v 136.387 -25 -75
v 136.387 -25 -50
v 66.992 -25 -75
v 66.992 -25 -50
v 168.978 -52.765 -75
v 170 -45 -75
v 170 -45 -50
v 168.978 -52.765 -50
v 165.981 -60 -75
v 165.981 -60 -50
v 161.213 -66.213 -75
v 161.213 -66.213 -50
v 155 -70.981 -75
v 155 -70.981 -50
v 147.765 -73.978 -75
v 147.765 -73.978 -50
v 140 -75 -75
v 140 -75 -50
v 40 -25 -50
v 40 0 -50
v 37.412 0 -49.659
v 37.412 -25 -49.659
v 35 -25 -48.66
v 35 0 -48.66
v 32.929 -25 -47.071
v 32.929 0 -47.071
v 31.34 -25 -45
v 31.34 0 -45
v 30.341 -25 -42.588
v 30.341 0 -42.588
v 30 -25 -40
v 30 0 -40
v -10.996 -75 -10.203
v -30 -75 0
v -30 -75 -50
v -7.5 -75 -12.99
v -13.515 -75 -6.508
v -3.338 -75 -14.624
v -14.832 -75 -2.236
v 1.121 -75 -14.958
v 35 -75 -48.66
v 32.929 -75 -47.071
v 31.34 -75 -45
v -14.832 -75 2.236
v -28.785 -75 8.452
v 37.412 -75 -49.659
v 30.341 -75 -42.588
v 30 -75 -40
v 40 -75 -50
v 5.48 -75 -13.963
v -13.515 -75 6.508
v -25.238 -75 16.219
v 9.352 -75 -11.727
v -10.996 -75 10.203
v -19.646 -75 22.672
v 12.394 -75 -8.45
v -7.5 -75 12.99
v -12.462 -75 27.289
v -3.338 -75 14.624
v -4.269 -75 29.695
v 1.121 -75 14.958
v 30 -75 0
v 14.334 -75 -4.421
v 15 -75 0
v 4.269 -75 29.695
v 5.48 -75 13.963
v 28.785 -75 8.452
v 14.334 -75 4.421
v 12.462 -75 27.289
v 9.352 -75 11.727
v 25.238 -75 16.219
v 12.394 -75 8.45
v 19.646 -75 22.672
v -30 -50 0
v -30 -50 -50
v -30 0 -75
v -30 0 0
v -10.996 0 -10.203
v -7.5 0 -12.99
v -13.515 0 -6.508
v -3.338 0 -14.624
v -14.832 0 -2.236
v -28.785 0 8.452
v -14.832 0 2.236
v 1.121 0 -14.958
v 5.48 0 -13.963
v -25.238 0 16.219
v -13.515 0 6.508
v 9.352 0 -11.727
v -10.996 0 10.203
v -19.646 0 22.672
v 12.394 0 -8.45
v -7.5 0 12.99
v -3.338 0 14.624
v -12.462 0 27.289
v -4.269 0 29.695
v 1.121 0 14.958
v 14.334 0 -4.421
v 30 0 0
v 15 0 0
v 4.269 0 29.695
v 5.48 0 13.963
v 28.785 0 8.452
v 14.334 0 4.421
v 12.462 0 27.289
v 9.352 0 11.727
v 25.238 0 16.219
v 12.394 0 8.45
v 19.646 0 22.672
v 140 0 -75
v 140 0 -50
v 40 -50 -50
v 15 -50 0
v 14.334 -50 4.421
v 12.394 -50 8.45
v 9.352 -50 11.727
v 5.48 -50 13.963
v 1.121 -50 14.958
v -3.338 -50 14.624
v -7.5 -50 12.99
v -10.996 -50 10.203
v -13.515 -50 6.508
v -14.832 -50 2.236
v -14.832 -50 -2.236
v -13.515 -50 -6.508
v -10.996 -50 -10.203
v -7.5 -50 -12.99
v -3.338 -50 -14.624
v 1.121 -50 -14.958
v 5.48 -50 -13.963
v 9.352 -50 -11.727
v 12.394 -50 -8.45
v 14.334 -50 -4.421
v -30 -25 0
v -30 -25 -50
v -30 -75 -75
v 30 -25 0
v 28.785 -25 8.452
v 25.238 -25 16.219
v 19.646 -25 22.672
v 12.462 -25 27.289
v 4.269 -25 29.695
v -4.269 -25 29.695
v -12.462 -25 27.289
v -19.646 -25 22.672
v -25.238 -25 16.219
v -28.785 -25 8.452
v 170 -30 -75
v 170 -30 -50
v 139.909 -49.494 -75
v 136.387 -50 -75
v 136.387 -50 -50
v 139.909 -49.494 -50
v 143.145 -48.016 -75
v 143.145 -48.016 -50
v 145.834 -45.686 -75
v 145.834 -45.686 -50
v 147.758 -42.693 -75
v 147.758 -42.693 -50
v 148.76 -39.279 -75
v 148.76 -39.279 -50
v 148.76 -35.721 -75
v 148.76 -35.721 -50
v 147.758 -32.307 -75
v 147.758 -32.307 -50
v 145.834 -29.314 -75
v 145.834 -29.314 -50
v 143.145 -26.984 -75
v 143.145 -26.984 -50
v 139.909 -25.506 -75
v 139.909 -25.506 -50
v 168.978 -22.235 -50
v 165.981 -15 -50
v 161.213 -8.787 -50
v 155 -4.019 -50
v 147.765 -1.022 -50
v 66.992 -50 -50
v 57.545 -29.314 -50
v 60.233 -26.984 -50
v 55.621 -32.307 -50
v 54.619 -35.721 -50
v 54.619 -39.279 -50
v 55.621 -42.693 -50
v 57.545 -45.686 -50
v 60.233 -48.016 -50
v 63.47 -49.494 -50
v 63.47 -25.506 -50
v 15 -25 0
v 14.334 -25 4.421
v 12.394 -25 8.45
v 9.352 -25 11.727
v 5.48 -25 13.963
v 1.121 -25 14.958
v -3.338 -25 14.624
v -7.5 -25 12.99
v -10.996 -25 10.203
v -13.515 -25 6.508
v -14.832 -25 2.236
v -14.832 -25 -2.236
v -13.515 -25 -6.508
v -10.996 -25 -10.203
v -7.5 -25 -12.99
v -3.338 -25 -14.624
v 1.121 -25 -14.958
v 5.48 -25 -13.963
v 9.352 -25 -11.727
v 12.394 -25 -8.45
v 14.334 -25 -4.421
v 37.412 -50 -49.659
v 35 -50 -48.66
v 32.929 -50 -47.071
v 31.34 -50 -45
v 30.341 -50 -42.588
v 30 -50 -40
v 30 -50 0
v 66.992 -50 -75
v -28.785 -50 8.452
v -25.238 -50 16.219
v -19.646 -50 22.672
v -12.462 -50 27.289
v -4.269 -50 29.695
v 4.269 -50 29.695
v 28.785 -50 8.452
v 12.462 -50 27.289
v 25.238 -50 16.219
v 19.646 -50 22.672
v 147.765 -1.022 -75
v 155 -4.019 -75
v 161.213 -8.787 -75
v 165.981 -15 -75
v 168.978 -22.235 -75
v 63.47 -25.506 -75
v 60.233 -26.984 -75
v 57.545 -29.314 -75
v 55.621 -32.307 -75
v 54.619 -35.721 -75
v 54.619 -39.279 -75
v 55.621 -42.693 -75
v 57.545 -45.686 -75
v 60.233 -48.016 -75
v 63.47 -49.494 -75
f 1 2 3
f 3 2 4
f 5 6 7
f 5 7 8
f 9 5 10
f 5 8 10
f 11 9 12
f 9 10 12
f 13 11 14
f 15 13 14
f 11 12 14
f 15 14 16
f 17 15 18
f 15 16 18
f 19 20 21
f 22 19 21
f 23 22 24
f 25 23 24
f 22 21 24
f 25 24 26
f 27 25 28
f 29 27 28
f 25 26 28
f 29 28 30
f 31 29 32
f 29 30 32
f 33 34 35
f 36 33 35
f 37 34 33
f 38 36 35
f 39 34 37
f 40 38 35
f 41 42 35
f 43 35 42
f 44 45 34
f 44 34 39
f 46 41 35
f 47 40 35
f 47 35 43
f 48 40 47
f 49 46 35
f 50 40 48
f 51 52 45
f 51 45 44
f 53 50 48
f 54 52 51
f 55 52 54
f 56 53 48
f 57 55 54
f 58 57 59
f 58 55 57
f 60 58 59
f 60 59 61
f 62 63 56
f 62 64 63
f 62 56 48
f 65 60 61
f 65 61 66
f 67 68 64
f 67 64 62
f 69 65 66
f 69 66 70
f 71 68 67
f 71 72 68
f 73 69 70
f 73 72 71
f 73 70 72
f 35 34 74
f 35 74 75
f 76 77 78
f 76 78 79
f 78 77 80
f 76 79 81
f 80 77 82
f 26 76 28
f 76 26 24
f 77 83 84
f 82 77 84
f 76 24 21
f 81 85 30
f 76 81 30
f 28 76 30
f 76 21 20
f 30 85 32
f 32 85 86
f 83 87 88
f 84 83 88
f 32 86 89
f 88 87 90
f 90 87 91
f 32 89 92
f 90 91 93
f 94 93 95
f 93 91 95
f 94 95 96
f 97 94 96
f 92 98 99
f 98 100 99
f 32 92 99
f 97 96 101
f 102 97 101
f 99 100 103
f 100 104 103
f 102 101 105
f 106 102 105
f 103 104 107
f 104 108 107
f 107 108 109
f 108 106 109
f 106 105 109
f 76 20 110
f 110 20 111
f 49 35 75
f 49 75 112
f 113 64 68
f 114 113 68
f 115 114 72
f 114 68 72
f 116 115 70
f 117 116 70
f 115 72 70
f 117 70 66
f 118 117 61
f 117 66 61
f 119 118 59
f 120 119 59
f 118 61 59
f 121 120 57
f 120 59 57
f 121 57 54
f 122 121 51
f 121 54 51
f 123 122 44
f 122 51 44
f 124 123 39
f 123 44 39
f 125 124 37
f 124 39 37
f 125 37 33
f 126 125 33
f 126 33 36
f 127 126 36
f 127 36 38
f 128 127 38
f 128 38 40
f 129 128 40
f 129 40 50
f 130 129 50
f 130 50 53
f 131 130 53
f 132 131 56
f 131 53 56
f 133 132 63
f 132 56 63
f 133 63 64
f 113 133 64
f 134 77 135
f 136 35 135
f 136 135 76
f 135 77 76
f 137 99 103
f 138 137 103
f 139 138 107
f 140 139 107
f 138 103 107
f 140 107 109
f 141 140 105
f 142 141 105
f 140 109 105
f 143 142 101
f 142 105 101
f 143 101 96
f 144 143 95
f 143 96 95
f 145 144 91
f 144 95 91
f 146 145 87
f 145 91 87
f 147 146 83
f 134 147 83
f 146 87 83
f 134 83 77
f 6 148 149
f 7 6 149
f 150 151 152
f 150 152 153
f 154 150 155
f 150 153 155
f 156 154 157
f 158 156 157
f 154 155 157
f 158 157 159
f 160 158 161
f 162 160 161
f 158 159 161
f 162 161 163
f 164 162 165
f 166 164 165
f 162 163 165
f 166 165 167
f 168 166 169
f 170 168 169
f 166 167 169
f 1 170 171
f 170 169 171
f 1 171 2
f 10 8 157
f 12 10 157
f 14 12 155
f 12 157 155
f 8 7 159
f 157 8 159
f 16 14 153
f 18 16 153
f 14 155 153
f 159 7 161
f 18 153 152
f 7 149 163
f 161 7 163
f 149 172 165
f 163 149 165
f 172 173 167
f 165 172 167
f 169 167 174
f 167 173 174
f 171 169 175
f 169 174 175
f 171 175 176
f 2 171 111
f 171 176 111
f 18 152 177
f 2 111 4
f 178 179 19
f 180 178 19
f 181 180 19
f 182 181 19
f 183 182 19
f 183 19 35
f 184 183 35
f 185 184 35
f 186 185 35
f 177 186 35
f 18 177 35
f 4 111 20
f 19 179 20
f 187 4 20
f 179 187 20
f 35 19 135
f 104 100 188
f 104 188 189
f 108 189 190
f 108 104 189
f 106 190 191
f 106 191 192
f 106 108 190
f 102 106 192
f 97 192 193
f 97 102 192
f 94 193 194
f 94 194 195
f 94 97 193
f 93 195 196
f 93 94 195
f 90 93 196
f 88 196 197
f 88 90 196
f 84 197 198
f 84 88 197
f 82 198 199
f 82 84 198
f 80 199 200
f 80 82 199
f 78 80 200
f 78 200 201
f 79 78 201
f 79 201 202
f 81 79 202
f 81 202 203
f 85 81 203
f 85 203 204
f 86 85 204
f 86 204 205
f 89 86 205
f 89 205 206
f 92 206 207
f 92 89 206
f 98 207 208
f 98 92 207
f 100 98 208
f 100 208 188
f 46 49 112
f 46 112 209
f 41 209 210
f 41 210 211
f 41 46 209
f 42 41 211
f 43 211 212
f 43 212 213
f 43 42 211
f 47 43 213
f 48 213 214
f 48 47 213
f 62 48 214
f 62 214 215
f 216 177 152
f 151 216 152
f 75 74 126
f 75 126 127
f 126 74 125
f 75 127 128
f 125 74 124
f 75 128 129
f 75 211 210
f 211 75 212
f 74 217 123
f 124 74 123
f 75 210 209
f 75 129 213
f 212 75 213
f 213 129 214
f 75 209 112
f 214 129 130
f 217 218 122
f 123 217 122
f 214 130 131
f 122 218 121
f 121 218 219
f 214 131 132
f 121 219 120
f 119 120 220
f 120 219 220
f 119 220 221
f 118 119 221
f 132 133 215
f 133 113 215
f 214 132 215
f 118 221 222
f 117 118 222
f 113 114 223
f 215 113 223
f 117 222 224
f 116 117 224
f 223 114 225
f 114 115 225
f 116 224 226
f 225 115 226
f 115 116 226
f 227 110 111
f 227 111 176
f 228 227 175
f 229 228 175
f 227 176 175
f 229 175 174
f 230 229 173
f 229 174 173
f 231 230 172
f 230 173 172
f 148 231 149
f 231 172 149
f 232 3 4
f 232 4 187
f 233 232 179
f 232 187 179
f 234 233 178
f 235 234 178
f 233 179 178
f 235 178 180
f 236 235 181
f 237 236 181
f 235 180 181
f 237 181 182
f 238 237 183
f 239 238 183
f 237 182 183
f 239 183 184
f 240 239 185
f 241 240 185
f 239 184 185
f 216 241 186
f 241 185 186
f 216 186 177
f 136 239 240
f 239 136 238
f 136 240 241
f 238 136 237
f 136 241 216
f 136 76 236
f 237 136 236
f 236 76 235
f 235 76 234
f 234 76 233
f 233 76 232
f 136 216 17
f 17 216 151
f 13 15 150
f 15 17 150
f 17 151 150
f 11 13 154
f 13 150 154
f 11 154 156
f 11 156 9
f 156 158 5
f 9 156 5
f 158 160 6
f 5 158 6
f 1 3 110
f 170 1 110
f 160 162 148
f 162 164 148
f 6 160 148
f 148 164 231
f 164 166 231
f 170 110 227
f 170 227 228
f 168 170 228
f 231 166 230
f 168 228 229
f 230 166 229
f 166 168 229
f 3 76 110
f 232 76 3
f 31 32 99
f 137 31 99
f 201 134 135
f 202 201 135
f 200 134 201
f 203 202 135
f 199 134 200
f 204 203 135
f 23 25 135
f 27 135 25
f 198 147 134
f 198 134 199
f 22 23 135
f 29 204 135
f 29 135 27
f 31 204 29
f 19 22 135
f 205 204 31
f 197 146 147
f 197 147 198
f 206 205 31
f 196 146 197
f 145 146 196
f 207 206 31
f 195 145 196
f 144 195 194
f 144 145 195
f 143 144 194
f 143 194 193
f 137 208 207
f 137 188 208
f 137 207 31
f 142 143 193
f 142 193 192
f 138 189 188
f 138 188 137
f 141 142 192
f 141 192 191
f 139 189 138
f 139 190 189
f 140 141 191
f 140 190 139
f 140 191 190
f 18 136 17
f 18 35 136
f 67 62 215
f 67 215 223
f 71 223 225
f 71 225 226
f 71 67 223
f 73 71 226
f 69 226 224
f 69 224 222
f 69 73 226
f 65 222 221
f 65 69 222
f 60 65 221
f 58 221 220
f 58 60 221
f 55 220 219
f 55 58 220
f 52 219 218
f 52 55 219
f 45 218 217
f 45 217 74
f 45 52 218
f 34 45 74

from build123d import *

# Parameters (mm, degrees)
F1_DEPTH = 75
F0_R     = 15
F2_DEPTH = 25
F3_R     = 15
F4_DEPTH = 25
F6_DEPTH = 25
F7_R     = 30


with BuildPart() as f1:
    # F0 (on Front) → F1 (new body)
    with BuildSketch(Plane.XZ):
        Polygon((40, -50), (-30, -50), (-30, -75), (170, -75), (170, -50), align=None)
    extrude(amount=F1_DEPTH)

    # F0 (on Front) → F2 (join)
    with BuildSketch(Plane.XZ):
        with BuildLine():
            Line((30, -40), (30, 0))
            ThreePointArc((30, 0), (0, 30), (-30, 0))
            Line((-30, 0), (-30, -50))
            Line((-30, -50), (40, -50))
            ThreePointArc((40, -50), (32.928932, -47.071068), (30, -40))
        make_face()
        Circle(F0_R, mode=Mode.SUBTRACT)
    extrude(amount=F2_DEPTH)

    # F5 (on face) → F6 (cut)
    with BuildSketch(Plane.XY.offset(-50)):
        with BuildLine():
            Line((136.387348, -25), (66.991508, -25))
            ThreePointArc((66.991508, -25), (54.491508, -37.5), (66.991508, -50))
            Line((66.991508, -50), (136.387348, -50))
            ThreePointArc((136.387348, -50), (148.887348, -37.5), (136.387348, -25))
        make_face()
    extrude(amount=-F6_DEPTH, mode=Mode.SUBTRACT)

    # F7
    f7_edges = [f1.edges().sort_by_distance(p)[0] for p in [
        (170, -75, -62.5),
        (170, 0, -62.5),
    ]]
    fillet(f7_edges, radius=F7_R)


with BuildPart() as f4:
    # F3 (on face) → F4 (new body)
    with BuildSketch(Plane.XZ.offset(75)):
        with BuildLine():
            Line((30, -40), (30, 0))
            ThreePointArc((30, 0), (0, 30), (-30, 0))
            Line((-30, 0), (-30, -50))
            Line((-30, -50), (30, -50))
            Line((30, -50), (40, -50))
            ThreePointArc((40, -50), (32.928932, -47.071068), (30, -40))
        make_face()
        Circle(F3_R, mode=Mode.SUBTRACT)
    extrude(amount=-F4_DEPTH)


solid = Compound([f1.part, f4.part])
